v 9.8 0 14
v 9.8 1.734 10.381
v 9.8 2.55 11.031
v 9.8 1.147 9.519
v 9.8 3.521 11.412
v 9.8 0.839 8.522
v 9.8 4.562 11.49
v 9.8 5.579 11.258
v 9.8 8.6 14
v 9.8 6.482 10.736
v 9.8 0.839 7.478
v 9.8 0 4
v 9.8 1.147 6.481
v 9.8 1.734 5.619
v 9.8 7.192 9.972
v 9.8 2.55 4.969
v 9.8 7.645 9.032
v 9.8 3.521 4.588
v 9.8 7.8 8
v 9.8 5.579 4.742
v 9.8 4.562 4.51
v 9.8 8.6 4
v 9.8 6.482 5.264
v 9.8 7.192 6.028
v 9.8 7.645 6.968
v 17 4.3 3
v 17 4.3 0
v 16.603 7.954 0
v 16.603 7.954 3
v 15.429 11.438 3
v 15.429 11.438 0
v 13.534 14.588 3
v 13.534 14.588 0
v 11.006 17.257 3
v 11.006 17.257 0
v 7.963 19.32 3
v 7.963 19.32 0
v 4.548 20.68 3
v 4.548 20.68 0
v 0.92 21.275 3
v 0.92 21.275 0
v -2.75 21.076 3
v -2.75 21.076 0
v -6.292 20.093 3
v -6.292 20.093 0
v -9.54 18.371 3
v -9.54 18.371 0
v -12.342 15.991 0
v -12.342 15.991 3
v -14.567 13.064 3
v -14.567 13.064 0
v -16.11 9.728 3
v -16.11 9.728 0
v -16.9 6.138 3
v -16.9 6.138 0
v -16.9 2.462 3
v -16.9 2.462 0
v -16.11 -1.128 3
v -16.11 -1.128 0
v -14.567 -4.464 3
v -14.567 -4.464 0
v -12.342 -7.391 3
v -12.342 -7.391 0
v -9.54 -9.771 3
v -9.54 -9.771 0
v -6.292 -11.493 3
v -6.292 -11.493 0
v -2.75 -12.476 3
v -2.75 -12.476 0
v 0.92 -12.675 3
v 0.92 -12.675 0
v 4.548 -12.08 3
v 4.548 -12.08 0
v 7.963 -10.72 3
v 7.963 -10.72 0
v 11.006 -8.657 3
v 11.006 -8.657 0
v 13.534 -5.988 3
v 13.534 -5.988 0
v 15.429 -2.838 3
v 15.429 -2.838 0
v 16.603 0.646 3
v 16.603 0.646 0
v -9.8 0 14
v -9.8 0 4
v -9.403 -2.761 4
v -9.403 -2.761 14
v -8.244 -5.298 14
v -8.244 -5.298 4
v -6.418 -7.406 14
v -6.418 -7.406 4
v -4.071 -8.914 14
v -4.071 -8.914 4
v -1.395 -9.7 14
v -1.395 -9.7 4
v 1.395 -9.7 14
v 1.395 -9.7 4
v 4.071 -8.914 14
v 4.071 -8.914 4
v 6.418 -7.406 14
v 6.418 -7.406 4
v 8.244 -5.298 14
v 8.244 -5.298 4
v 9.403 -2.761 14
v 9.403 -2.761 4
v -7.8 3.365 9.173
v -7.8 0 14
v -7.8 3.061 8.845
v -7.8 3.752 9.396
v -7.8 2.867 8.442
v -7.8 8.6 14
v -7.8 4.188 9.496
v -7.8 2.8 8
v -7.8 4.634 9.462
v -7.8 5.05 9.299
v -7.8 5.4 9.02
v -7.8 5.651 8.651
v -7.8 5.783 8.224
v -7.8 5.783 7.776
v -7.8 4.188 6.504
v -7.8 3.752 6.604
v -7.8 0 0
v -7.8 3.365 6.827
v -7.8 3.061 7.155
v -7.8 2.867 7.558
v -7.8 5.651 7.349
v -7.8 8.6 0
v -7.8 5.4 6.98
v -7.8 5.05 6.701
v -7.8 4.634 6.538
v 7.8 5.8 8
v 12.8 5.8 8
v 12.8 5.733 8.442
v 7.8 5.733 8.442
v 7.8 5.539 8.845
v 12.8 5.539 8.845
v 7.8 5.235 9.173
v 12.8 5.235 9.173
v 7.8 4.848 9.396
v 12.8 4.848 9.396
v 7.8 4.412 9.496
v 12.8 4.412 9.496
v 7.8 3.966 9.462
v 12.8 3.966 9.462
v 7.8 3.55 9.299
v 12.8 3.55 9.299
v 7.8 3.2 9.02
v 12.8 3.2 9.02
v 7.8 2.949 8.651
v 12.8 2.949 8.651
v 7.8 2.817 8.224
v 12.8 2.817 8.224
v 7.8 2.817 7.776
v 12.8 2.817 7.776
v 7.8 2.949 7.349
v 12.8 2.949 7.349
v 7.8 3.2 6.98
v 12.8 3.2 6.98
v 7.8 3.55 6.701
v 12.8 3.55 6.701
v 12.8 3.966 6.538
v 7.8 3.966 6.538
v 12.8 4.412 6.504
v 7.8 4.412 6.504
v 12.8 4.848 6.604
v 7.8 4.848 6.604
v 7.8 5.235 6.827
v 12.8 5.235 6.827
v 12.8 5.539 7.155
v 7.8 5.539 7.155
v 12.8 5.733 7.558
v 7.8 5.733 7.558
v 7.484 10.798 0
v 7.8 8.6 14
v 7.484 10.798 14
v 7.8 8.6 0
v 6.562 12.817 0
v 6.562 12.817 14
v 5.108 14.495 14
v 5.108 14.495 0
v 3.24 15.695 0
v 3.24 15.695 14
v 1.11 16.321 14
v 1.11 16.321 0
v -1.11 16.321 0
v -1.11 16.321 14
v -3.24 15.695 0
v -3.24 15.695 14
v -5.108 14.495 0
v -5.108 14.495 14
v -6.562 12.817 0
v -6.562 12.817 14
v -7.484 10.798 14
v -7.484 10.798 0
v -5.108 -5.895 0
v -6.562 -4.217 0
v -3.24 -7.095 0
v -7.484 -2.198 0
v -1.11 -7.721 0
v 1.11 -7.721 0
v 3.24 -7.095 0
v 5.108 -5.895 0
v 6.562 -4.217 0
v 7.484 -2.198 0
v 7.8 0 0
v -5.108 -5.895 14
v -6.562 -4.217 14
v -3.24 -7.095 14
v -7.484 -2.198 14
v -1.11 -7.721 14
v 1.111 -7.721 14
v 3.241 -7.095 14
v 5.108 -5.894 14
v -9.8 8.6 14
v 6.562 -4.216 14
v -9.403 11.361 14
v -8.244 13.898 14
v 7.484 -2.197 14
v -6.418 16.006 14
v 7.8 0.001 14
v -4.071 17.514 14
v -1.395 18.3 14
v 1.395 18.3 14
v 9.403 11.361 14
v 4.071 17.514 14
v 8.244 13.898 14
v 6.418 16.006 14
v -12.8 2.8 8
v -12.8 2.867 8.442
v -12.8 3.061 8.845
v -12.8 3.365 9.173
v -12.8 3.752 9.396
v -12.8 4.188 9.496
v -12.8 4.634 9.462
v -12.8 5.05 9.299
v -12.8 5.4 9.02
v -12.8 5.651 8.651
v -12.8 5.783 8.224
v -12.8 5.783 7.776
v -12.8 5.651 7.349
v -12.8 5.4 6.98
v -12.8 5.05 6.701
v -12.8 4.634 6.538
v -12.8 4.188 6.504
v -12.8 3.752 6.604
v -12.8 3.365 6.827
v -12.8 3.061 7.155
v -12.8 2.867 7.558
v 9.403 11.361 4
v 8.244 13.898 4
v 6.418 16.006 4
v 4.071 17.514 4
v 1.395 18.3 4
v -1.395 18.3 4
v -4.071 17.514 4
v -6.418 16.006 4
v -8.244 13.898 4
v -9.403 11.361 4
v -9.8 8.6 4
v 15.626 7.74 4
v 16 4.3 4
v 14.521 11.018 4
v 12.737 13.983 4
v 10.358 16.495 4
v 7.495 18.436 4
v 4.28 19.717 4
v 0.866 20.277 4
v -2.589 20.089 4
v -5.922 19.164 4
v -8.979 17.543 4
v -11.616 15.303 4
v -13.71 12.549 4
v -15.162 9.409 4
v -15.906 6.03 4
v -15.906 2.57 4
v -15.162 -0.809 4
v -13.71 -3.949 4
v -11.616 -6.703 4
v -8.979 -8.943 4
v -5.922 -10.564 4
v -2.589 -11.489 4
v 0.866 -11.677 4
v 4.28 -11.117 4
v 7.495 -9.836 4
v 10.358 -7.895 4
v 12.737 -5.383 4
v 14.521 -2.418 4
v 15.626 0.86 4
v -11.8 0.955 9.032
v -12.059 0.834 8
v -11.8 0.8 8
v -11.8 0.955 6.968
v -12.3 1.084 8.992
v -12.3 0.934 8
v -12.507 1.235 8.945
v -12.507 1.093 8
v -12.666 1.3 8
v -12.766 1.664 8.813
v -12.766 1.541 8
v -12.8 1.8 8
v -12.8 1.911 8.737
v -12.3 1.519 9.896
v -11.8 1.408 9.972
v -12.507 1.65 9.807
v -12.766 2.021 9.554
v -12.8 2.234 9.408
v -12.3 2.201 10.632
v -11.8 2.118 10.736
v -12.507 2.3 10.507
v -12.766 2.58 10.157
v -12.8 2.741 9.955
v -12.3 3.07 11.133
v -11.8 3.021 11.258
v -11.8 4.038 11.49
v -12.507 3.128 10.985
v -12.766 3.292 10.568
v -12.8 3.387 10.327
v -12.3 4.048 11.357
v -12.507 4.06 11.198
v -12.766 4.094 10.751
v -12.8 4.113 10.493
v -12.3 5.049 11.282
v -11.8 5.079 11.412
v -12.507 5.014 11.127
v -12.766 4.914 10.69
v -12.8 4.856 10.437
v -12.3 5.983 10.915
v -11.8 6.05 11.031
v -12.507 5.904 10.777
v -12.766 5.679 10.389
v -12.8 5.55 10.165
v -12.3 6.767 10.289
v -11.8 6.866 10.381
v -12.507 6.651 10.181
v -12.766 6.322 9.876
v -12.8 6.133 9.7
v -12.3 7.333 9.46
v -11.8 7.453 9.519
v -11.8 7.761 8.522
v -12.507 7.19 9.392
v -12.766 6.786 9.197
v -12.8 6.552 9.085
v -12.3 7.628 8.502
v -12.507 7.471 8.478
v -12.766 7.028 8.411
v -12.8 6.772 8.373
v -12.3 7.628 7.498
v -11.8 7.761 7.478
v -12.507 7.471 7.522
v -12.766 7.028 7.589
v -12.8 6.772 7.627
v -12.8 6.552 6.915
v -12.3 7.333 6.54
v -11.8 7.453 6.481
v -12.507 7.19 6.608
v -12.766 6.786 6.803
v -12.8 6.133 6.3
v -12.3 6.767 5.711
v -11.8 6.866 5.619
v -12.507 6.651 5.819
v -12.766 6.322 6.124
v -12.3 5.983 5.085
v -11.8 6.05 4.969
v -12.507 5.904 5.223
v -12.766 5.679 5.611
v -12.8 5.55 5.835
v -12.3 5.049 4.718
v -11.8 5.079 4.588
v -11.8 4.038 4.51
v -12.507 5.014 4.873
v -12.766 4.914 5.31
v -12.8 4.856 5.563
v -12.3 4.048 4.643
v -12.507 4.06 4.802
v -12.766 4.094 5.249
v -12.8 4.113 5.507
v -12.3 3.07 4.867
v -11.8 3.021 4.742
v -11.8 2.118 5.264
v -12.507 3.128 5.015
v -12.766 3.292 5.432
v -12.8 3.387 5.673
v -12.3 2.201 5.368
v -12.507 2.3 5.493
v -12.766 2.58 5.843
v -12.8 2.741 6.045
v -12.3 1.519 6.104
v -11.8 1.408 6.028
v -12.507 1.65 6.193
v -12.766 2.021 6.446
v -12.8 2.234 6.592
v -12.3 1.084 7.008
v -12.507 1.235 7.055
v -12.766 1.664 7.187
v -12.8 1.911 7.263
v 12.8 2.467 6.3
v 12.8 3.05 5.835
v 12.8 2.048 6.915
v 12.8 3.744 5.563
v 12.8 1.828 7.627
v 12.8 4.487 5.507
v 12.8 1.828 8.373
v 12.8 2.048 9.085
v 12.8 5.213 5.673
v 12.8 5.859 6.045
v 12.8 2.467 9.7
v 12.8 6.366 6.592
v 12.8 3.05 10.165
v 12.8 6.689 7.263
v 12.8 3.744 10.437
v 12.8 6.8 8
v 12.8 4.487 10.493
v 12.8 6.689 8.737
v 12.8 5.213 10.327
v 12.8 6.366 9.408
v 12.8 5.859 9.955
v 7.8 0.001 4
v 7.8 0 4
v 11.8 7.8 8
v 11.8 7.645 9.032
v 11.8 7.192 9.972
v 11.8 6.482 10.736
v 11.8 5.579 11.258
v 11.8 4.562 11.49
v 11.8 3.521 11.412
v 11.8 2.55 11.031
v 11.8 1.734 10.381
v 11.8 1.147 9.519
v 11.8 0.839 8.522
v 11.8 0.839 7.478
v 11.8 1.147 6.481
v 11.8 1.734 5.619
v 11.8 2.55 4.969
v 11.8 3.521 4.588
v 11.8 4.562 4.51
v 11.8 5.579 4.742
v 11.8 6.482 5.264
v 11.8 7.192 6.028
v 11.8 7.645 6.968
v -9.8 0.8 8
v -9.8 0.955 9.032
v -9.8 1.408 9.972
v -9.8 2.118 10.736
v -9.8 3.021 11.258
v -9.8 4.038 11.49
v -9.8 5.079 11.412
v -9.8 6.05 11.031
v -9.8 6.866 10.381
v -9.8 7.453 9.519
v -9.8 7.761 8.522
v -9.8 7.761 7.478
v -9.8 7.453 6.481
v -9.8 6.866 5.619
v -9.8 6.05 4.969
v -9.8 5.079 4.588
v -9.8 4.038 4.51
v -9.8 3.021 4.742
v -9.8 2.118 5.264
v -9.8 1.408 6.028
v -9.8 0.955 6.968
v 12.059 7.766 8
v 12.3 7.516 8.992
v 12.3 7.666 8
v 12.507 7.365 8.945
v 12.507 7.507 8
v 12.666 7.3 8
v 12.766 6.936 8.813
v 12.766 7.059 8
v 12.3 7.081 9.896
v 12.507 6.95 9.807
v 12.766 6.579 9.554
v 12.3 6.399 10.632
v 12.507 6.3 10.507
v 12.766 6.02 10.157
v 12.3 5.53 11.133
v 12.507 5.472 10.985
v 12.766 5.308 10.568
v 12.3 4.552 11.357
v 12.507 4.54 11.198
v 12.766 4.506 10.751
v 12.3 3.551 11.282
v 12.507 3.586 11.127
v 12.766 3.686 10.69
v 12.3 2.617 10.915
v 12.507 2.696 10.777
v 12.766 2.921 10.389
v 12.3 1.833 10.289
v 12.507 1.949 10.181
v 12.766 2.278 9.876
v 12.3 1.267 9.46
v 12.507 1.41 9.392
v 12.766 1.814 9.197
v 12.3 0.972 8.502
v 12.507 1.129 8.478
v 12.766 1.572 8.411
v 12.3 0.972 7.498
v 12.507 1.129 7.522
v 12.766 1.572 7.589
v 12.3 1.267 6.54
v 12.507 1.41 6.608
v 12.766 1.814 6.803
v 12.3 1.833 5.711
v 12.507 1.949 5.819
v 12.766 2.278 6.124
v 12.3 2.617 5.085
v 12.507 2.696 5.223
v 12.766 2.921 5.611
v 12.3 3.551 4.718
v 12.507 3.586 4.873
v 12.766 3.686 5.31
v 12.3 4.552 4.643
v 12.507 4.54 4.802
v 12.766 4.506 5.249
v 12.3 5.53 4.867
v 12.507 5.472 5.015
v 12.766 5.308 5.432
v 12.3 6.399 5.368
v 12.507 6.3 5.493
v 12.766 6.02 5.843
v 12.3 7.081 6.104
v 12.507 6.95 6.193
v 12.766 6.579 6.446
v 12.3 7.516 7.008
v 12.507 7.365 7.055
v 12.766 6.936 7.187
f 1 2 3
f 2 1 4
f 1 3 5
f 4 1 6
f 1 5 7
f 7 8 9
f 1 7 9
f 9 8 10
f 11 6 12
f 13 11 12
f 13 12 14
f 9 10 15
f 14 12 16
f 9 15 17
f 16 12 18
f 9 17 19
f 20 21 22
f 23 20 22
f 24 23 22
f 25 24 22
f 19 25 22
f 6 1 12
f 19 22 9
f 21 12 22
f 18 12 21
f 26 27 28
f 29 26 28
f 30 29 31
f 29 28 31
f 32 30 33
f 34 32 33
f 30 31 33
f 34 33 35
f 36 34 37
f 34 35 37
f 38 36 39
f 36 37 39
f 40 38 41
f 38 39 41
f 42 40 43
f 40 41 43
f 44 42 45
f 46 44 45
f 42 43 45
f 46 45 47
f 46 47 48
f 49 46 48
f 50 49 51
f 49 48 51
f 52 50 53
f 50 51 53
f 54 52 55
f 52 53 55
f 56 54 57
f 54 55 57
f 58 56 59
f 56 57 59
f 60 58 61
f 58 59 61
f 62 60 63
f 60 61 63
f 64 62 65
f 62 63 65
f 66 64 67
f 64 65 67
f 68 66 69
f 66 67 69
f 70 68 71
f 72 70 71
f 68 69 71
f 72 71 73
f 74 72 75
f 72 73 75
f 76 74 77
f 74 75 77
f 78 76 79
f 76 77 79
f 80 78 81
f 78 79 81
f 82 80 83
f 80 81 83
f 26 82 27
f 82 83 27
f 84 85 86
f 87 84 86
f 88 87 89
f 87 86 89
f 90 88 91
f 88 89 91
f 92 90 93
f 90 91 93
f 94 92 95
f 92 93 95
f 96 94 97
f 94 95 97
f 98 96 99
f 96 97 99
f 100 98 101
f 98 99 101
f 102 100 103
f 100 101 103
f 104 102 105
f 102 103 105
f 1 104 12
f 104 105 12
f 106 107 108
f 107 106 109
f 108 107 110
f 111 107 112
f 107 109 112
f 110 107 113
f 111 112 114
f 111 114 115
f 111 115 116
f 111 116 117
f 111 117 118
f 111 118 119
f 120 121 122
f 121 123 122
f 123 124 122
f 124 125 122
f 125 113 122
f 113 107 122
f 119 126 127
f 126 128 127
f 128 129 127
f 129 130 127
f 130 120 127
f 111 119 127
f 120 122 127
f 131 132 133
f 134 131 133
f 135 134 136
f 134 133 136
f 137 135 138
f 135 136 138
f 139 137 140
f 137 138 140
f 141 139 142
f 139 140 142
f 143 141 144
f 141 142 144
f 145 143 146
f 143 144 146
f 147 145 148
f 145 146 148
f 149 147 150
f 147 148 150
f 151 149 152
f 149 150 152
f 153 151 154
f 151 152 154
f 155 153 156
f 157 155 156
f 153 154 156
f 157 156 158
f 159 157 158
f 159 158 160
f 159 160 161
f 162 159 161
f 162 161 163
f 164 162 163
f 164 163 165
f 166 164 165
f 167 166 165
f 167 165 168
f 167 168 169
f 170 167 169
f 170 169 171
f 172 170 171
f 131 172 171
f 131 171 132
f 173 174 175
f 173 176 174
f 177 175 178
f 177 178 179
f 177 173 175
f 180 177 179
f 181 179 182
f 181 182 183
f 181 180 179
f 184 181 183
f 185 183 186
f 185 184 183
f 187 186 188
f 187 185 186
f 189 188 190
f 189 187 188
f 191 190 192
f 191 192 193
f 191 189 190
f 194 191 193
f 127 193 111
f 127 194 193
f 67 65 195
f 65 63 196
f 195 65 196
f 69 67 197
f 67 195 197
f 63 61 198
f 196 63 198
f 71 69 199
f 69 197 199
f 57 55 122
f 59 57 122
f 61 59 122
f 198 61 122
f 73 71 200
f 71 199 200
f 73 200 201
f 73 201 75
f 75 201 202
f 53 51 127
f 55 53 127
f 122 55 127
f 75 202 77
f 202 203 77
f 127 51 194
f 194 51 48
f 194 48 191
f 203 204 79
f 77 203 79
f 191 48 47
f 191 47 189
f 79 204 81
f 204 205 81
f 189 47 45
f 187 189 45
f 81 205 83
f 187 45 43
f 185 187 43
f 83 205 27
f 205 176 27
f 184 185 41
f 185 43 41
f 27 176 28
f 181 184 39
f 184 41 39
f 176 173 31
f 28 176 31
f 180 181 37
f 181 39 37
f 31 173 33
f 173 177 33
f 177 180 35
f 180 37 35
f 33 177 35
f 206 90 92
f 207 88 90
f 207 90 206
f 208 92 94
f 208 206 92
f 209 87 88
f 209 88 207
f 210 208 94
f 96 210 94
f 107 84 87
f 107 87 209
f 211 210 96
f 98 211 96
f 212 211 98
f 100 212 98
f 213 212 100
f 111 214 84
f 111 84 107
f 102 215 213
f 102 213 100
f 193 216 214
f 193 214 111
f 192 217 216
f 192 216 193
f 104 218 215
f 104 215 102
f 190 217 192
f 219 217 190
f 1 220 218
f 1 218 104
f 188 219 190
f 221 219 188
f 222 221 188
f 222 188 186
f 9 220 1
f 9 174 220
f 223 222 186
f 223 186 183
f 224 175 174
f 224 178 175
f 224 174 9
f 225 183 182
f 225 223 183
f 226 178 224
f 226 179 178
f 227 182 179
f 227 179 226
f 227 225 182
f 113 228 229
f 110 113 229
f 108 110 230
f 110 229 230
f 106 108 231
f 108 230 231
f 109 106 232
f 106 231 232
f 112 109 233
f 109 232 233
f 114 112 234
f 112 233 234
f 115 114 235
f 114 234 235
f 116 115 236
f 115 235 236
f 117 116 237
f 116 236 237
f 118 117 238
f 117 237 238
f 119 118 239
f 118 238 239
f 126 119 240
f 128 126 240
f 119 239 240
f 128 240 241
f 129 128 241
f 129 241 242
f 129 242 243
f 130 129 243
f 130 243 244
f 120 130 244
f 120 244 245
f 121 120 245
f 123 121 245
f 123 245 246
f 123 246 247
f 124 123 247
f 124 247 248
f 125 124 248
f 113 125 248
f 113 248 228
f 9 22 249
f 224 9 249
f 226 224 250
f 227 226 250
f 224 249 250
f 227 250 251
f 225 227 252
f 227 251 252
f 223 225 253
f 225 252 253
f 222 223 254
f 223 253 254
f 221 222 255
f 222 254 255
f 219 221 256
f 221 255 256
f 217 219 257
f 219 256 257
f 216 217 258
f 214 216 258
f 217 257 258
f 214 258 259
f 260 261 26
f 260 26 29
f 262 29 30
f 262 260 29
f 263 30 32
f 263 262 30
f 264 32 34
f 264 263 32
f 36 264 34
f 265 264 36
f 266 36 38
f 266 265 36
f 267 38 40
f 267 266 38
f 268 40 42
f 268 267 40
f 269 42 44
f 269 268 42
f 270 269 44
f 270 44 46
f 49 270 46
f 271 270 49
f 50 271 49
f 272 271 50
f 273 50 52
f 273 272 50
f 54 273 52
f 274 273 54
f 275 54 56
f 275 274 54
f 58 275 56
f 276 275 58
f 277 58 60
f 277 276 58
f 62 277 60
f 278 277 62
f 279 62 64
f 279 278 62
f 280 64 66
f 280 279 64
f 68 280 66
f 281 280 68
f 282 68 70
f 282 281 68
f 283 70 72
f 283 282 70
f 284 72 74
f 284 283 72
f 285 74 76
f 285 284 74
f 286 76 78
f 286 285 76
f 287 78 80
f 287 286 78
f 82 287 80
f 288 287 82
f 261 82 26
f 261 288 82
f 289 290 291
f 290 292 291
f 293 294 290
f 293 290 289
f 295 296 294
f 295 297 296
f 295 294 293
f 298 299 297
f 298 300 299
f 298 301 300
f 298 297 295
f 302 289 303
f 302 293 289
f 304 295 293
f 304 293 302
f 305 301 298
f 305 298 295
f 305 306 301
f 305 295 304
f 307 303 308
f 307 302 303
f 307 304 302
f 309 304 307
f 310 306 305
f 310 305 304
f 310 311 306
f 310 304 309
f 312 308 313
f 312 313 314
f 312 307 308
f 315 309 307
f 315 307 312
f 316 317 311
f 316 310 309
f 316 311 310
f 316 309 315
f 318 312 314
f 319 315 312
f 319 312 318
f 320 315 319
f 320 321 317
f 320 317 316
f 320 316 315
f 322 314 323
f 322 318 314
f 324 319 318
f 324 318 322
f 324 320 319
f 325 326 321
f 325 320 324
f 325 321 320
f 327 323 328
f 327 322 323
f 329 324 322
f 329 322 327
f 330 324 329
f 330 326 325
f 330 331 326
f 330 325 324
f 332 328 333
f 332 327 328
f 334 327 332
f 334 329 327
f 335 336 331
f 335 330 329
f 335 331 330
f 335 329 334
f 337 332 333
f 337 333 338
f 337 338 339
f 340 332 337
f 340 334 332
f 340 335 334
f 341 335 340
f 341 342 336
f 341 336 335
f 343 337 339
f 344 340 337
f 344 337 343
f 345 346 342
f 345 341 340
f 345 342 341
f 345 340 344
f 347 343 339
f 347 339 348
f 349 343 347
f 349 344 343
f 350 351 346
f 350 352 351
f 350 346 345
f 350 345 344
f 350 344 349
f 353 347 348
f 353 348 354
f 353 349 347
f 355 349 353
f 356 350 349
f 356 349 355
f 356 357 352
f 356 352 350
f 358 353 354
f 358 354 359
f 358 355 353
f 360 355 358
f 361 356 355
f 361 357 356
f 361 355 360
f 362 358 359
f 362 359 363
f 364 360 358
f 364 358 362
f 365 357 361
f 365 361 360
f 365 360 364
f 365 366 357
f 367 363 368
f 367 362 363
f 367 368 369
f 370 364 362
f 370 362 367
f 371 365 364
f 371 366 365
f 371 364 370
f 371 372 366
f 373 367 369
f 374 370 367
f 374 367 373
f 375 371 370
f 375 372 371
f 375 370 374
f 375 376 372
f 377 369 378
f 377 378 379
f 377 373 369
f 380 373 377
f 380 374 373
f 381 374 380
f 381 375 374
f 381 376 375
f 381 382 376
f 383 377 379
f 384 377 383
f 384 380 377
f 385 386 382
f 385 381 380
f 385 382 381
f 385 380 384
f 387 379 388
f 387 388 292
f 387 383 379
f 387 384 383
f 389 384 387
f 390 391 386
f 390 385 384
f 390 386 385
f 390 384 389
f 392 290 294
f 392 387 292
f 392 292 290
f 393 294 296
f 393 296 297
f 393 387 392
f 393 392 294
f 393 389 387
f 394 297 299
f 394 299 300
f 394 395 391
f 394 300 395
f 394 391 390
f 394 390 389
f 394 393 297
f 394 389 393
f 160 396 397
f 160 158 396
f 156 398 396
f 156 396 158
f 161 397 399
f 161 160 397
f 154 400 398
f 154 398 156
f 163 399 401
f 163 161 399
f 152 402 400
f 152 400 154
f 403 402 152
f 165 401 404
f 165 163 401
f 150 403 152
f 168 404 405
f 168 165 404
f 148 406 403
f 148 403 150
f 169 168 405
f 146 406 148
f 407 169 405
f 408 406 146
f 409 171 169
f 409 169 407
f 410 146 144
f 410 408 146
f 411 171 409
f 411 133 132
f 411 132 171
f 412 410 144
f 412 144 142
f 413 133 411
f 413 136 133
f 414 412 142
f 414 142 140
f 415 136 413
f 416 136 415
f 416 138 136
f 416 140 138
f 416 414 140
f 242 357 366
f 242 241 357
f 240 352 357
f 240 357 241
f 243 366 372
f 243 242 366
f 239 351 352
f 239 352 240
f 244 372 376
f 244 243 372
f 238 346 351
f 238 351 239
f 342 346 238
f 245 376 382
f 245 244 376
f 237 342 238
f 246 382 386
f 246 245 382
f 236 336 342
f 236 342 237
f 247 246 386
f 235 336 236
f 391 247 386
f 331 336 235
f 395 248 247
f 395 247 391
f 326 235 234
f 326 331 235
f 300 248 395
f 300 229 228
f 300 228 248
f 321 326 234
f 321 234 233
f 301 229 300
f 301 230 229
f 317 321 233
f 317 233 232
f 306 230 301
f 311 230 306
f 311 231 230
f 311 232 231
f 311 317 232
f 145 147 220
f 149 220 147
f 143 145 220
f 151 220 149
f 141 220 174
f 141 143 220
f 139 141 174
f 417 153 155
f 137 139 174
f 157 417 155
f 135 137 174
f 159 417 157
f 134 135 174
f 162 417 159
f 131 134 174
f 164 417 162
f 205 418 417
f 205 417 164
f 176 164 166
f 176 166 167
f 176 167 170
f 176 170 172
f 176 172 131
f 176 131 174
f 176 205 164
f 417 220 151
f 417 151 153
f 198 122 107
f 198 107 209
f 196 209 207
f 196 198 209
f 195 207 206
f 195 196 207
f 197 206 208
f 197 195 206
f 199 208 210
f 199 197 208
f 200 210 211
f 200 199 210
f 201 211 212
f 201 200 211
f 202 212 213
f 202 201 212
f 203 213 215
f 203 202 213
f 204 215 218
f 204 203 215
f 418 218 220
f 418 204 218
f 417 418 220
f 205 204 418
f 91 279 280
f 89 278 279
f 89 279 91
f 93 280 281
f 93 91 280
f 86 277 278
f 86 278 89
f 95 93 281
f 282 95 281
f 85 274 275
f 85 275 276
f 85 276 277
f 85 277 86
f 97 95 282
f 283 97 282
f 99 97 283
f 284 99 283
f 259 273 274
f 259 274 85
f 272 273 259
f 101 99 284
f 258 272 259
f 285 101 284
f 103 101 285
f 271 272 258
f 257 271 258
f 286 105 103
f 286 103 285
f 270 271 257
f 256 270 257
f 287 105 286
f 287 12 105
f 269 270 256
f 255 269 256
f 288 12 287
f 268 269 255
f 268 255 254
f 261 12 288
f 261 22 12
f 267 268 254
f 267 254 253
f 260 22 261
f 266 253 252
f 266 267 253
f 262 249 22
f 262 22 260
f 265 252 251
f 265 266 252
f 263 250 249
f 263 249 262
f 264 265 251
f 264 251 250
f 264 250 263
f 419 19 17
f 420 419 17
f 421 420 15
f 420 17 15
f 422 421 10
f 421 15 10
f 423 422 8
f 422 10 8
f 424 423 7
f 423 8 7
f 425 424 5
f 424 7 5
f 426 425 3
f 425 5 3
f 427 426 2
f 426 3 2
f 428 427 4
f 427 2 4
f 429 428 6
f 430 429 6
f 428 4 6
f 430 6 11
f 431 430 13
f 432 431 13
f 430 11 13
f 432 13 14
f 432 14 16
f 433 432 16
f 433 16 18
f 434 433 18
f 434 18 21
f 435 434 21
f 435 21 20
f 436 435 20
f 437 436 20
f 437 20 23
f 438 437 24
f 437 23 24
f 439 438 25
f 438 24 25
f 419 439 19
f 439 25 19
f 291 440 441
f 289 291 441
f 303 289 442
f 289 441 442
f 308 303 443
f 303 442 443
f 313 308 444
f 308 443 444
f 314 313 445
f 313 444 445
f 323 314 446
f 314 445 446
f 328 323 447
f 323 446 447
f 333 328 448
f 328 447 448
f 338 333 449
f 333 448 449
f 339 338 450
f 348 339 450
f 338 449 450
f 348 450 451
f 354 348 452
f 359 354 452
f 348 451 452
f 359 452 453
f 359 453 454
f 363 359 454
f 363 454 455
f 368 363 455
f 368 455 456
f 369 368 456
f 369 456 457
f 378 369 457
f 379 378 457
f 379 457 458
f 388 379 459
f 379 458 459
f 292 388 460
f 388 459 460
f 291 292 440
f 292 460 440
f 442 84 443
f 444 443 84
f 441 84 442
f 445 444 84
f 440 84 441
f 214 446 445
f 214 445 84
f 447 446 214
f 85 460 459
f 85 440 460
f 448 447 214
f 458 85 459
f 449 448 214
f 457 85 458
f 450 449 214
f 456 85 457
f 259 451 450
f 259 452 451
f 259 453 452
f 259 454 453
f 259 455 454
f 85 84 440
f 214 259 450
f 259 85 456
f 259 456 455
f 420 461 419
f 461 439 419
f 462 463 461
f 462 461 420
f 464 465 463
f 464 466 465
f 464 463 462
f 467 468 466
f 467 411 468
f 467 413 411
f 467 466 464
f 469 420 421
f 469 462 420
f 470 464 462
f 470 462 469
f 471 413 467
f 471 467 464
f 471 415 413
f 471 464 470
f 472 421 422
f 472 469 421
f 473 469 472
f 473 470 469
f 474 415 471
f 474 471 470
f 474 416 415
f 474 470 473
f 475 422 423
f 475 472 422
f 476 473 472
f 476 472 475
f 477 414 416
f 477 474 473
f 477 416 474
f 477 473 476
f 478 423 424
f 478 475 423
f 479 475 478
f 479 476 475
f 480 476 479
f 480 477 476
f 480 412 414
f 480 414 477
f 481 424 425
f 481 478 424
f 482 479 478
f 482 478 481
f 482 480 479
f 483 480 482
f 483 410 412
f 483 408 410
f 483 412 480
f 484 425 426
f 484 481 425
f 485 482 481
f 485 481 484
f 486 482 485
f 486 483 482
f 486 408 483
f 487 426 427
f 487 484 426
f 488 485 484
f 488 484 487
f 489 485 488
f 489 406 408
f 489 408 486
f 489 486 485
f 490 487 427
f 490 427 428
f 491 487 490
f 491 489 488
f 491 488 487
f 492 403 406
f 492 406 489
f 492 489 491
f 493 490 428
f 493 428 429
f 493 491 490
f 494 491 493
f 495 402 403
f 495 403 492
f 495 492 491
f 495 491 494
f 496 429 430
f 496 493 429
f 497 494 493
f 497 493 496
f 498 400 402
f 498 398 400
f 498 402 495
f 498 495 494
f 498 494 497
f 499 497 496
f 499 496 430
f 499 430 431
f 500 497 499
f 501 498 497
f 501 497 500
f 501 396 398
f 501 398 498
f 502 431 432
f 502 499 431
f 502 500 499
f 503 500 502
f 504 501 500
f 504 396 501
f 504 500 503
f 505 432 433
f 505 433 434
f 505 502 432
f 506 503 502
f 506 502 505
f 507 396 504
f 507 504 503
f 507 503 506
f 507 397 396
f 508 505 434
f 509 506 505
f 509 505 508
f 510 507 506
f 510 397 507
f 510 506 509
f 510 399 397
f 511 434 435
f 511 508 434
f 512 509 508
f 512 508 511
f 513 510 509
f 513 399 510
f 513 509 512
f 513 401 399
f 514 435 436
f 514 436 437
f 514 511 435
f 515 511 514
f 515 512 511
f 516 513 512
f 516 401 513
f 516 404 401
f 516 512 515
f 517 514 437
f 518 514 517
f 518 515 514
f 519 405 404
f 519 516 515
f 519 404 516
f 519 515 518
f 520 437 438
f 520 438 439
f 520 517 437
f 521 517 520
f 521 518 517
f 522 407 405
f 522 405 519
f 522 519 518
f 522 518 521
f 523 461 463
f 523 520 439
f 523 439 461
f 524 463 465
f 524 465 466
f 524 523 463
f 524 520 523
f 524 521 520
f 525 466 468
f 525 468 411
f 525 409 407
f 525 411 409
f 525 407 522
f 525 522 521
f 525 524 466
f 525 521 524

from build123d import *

# Parameters (mm, degrees)
SKETCH_R        = 17
PAD_DEPTH       = 4
CHAMFER_SIZE    = 1
PAD001_DEPTH    = 10
SKETCH002_R     = 3.5
PAD002_DEPTH    = 3
SKETCH003_R     = 1.5
POCKET_DEPTH    = 6
FILLET_R        = 1
SKETCH004_R     = 3.5
PAD003_DEPTH    = 3
SKETCH005_R     = 1.5
POCKET001_DEPTH = 6
FILLET001_R     = 1


with BuildPart() as part:
    # Sketch → Pad (new body)
    with BuildSketch(Plane.XY):
        with Locations((0, 4.3)):
            Circle(SKETCH_R)
        with BuildLine():
            ThreePointArc((7.8, 8.6), (0, 16.4), (-7.8, 8.6))
            Line((-7.8, 8.6), (-7.8, 0))
            ThreePointArc((-7.8, 0), (0, -7.8), (7.8, 0))
            Line((7.8, 0), (7.8, 8.6))
        make_face(mode=Mode.SUBTRACT)
    extrude(amount=PAD_DEPTH)

    # Chamfer
    chamfer_edges = [part.edges().sort_by_distance(p)[0] for p in [
        (-17, 4.3, 4),
    ]]
    chamfer(chamfer_edges, length=CHAMFER_SIZE)

    # Sketch001 (on Face4 of Chamfer) → Pad001 (join)
    with BuildSketch(Plane.XY.offset(4)):
        with BuildLine():
            ThreePointArc((9.8, 8.6), (0, 18.4), (-9.8, 8.6))
            Line((-9.8, 0), (-9.8, 8.6))
            ThreePointArc((-9.8, 0), (0, -9.8), (9.8, 0))
            Line((9.8, 0), (9.8, 8.6))
        make_face()
        with BuildLine():
            ThreePointArc((7.8, 8.6), (0, 16.4), (-7.8, 8.6))
            Line((-7.8, 0), (-7.8, 8.6))
            ThreePointArc((-7.8, 0), (0.000482, -7.8), (7.8, 0.000965))
            Line((7.8, 0.000965), (7.8, 8.6))
        make_face(mode=Mode.SUBTRACT)
    extrude(amount=PAD001_DEPTH)

    # Sketch002 (on Face10 of Pad001) → Pad002 (join)
    with BuildSketch(Plane(origin=(-9.8, 0, 0), x_dir=(0, -1, 0), z_dir=(-1, 0, 0))):
        with Locations((-4.3, 8)):
            Circle(SKETCH002_R)
    extrude(amount=PAD002_DEPTH)

    # Sketch003 (on Face19 of Pad002) → Pocket (cut)
    with BuildSketch(Plane(origin=(-12.8, 0, 0), x_dir=(0, -1, 0), z_dir=(-1, 0, 0))):
        with Locations((-4.3, 8)):
            Circle(SKETCH003_R)
    extrude(amount=-POCKET_DEPTH, mode=Mode.SUBTRACT)

    # Fillet
    fillet_edges = [part.edges().sort_by_distance(p)[0] for p in [
        (-12.8, 7.8, 8),
    ]]
    fillet(fillet_edges, radius=FILLET_R)

    # Sketch004 (on Face10 of Fillet) → Pad003 (join)
    with BuildSketch(Plane.YZ.offset(9.8)):
        with Locations((4.3, 8)):
            Circle(SKETCH004_R)
    extrude(amount=PAD003_DEPTH)

    # Sketch005 (on Face22 of Pad003) → Pocket001 (cut)
    with BuildSketch(Plane.YZ.offset(12.8)):
        with Locations((4.3, 8)):
            Circle(SKETCH005_R)
    extrude(amount=-POCKET001_DEPTH, mode=Mode.SUBTRACT)

    # Fillet001
    fillet001_edges = [part.edges().sort_by_distance(p)[0] for p in [
        (12.8, 0.8, 8),
    ]]
    fillet(fillet001_edges, radius=FILLET001_R)


solid = part.part
